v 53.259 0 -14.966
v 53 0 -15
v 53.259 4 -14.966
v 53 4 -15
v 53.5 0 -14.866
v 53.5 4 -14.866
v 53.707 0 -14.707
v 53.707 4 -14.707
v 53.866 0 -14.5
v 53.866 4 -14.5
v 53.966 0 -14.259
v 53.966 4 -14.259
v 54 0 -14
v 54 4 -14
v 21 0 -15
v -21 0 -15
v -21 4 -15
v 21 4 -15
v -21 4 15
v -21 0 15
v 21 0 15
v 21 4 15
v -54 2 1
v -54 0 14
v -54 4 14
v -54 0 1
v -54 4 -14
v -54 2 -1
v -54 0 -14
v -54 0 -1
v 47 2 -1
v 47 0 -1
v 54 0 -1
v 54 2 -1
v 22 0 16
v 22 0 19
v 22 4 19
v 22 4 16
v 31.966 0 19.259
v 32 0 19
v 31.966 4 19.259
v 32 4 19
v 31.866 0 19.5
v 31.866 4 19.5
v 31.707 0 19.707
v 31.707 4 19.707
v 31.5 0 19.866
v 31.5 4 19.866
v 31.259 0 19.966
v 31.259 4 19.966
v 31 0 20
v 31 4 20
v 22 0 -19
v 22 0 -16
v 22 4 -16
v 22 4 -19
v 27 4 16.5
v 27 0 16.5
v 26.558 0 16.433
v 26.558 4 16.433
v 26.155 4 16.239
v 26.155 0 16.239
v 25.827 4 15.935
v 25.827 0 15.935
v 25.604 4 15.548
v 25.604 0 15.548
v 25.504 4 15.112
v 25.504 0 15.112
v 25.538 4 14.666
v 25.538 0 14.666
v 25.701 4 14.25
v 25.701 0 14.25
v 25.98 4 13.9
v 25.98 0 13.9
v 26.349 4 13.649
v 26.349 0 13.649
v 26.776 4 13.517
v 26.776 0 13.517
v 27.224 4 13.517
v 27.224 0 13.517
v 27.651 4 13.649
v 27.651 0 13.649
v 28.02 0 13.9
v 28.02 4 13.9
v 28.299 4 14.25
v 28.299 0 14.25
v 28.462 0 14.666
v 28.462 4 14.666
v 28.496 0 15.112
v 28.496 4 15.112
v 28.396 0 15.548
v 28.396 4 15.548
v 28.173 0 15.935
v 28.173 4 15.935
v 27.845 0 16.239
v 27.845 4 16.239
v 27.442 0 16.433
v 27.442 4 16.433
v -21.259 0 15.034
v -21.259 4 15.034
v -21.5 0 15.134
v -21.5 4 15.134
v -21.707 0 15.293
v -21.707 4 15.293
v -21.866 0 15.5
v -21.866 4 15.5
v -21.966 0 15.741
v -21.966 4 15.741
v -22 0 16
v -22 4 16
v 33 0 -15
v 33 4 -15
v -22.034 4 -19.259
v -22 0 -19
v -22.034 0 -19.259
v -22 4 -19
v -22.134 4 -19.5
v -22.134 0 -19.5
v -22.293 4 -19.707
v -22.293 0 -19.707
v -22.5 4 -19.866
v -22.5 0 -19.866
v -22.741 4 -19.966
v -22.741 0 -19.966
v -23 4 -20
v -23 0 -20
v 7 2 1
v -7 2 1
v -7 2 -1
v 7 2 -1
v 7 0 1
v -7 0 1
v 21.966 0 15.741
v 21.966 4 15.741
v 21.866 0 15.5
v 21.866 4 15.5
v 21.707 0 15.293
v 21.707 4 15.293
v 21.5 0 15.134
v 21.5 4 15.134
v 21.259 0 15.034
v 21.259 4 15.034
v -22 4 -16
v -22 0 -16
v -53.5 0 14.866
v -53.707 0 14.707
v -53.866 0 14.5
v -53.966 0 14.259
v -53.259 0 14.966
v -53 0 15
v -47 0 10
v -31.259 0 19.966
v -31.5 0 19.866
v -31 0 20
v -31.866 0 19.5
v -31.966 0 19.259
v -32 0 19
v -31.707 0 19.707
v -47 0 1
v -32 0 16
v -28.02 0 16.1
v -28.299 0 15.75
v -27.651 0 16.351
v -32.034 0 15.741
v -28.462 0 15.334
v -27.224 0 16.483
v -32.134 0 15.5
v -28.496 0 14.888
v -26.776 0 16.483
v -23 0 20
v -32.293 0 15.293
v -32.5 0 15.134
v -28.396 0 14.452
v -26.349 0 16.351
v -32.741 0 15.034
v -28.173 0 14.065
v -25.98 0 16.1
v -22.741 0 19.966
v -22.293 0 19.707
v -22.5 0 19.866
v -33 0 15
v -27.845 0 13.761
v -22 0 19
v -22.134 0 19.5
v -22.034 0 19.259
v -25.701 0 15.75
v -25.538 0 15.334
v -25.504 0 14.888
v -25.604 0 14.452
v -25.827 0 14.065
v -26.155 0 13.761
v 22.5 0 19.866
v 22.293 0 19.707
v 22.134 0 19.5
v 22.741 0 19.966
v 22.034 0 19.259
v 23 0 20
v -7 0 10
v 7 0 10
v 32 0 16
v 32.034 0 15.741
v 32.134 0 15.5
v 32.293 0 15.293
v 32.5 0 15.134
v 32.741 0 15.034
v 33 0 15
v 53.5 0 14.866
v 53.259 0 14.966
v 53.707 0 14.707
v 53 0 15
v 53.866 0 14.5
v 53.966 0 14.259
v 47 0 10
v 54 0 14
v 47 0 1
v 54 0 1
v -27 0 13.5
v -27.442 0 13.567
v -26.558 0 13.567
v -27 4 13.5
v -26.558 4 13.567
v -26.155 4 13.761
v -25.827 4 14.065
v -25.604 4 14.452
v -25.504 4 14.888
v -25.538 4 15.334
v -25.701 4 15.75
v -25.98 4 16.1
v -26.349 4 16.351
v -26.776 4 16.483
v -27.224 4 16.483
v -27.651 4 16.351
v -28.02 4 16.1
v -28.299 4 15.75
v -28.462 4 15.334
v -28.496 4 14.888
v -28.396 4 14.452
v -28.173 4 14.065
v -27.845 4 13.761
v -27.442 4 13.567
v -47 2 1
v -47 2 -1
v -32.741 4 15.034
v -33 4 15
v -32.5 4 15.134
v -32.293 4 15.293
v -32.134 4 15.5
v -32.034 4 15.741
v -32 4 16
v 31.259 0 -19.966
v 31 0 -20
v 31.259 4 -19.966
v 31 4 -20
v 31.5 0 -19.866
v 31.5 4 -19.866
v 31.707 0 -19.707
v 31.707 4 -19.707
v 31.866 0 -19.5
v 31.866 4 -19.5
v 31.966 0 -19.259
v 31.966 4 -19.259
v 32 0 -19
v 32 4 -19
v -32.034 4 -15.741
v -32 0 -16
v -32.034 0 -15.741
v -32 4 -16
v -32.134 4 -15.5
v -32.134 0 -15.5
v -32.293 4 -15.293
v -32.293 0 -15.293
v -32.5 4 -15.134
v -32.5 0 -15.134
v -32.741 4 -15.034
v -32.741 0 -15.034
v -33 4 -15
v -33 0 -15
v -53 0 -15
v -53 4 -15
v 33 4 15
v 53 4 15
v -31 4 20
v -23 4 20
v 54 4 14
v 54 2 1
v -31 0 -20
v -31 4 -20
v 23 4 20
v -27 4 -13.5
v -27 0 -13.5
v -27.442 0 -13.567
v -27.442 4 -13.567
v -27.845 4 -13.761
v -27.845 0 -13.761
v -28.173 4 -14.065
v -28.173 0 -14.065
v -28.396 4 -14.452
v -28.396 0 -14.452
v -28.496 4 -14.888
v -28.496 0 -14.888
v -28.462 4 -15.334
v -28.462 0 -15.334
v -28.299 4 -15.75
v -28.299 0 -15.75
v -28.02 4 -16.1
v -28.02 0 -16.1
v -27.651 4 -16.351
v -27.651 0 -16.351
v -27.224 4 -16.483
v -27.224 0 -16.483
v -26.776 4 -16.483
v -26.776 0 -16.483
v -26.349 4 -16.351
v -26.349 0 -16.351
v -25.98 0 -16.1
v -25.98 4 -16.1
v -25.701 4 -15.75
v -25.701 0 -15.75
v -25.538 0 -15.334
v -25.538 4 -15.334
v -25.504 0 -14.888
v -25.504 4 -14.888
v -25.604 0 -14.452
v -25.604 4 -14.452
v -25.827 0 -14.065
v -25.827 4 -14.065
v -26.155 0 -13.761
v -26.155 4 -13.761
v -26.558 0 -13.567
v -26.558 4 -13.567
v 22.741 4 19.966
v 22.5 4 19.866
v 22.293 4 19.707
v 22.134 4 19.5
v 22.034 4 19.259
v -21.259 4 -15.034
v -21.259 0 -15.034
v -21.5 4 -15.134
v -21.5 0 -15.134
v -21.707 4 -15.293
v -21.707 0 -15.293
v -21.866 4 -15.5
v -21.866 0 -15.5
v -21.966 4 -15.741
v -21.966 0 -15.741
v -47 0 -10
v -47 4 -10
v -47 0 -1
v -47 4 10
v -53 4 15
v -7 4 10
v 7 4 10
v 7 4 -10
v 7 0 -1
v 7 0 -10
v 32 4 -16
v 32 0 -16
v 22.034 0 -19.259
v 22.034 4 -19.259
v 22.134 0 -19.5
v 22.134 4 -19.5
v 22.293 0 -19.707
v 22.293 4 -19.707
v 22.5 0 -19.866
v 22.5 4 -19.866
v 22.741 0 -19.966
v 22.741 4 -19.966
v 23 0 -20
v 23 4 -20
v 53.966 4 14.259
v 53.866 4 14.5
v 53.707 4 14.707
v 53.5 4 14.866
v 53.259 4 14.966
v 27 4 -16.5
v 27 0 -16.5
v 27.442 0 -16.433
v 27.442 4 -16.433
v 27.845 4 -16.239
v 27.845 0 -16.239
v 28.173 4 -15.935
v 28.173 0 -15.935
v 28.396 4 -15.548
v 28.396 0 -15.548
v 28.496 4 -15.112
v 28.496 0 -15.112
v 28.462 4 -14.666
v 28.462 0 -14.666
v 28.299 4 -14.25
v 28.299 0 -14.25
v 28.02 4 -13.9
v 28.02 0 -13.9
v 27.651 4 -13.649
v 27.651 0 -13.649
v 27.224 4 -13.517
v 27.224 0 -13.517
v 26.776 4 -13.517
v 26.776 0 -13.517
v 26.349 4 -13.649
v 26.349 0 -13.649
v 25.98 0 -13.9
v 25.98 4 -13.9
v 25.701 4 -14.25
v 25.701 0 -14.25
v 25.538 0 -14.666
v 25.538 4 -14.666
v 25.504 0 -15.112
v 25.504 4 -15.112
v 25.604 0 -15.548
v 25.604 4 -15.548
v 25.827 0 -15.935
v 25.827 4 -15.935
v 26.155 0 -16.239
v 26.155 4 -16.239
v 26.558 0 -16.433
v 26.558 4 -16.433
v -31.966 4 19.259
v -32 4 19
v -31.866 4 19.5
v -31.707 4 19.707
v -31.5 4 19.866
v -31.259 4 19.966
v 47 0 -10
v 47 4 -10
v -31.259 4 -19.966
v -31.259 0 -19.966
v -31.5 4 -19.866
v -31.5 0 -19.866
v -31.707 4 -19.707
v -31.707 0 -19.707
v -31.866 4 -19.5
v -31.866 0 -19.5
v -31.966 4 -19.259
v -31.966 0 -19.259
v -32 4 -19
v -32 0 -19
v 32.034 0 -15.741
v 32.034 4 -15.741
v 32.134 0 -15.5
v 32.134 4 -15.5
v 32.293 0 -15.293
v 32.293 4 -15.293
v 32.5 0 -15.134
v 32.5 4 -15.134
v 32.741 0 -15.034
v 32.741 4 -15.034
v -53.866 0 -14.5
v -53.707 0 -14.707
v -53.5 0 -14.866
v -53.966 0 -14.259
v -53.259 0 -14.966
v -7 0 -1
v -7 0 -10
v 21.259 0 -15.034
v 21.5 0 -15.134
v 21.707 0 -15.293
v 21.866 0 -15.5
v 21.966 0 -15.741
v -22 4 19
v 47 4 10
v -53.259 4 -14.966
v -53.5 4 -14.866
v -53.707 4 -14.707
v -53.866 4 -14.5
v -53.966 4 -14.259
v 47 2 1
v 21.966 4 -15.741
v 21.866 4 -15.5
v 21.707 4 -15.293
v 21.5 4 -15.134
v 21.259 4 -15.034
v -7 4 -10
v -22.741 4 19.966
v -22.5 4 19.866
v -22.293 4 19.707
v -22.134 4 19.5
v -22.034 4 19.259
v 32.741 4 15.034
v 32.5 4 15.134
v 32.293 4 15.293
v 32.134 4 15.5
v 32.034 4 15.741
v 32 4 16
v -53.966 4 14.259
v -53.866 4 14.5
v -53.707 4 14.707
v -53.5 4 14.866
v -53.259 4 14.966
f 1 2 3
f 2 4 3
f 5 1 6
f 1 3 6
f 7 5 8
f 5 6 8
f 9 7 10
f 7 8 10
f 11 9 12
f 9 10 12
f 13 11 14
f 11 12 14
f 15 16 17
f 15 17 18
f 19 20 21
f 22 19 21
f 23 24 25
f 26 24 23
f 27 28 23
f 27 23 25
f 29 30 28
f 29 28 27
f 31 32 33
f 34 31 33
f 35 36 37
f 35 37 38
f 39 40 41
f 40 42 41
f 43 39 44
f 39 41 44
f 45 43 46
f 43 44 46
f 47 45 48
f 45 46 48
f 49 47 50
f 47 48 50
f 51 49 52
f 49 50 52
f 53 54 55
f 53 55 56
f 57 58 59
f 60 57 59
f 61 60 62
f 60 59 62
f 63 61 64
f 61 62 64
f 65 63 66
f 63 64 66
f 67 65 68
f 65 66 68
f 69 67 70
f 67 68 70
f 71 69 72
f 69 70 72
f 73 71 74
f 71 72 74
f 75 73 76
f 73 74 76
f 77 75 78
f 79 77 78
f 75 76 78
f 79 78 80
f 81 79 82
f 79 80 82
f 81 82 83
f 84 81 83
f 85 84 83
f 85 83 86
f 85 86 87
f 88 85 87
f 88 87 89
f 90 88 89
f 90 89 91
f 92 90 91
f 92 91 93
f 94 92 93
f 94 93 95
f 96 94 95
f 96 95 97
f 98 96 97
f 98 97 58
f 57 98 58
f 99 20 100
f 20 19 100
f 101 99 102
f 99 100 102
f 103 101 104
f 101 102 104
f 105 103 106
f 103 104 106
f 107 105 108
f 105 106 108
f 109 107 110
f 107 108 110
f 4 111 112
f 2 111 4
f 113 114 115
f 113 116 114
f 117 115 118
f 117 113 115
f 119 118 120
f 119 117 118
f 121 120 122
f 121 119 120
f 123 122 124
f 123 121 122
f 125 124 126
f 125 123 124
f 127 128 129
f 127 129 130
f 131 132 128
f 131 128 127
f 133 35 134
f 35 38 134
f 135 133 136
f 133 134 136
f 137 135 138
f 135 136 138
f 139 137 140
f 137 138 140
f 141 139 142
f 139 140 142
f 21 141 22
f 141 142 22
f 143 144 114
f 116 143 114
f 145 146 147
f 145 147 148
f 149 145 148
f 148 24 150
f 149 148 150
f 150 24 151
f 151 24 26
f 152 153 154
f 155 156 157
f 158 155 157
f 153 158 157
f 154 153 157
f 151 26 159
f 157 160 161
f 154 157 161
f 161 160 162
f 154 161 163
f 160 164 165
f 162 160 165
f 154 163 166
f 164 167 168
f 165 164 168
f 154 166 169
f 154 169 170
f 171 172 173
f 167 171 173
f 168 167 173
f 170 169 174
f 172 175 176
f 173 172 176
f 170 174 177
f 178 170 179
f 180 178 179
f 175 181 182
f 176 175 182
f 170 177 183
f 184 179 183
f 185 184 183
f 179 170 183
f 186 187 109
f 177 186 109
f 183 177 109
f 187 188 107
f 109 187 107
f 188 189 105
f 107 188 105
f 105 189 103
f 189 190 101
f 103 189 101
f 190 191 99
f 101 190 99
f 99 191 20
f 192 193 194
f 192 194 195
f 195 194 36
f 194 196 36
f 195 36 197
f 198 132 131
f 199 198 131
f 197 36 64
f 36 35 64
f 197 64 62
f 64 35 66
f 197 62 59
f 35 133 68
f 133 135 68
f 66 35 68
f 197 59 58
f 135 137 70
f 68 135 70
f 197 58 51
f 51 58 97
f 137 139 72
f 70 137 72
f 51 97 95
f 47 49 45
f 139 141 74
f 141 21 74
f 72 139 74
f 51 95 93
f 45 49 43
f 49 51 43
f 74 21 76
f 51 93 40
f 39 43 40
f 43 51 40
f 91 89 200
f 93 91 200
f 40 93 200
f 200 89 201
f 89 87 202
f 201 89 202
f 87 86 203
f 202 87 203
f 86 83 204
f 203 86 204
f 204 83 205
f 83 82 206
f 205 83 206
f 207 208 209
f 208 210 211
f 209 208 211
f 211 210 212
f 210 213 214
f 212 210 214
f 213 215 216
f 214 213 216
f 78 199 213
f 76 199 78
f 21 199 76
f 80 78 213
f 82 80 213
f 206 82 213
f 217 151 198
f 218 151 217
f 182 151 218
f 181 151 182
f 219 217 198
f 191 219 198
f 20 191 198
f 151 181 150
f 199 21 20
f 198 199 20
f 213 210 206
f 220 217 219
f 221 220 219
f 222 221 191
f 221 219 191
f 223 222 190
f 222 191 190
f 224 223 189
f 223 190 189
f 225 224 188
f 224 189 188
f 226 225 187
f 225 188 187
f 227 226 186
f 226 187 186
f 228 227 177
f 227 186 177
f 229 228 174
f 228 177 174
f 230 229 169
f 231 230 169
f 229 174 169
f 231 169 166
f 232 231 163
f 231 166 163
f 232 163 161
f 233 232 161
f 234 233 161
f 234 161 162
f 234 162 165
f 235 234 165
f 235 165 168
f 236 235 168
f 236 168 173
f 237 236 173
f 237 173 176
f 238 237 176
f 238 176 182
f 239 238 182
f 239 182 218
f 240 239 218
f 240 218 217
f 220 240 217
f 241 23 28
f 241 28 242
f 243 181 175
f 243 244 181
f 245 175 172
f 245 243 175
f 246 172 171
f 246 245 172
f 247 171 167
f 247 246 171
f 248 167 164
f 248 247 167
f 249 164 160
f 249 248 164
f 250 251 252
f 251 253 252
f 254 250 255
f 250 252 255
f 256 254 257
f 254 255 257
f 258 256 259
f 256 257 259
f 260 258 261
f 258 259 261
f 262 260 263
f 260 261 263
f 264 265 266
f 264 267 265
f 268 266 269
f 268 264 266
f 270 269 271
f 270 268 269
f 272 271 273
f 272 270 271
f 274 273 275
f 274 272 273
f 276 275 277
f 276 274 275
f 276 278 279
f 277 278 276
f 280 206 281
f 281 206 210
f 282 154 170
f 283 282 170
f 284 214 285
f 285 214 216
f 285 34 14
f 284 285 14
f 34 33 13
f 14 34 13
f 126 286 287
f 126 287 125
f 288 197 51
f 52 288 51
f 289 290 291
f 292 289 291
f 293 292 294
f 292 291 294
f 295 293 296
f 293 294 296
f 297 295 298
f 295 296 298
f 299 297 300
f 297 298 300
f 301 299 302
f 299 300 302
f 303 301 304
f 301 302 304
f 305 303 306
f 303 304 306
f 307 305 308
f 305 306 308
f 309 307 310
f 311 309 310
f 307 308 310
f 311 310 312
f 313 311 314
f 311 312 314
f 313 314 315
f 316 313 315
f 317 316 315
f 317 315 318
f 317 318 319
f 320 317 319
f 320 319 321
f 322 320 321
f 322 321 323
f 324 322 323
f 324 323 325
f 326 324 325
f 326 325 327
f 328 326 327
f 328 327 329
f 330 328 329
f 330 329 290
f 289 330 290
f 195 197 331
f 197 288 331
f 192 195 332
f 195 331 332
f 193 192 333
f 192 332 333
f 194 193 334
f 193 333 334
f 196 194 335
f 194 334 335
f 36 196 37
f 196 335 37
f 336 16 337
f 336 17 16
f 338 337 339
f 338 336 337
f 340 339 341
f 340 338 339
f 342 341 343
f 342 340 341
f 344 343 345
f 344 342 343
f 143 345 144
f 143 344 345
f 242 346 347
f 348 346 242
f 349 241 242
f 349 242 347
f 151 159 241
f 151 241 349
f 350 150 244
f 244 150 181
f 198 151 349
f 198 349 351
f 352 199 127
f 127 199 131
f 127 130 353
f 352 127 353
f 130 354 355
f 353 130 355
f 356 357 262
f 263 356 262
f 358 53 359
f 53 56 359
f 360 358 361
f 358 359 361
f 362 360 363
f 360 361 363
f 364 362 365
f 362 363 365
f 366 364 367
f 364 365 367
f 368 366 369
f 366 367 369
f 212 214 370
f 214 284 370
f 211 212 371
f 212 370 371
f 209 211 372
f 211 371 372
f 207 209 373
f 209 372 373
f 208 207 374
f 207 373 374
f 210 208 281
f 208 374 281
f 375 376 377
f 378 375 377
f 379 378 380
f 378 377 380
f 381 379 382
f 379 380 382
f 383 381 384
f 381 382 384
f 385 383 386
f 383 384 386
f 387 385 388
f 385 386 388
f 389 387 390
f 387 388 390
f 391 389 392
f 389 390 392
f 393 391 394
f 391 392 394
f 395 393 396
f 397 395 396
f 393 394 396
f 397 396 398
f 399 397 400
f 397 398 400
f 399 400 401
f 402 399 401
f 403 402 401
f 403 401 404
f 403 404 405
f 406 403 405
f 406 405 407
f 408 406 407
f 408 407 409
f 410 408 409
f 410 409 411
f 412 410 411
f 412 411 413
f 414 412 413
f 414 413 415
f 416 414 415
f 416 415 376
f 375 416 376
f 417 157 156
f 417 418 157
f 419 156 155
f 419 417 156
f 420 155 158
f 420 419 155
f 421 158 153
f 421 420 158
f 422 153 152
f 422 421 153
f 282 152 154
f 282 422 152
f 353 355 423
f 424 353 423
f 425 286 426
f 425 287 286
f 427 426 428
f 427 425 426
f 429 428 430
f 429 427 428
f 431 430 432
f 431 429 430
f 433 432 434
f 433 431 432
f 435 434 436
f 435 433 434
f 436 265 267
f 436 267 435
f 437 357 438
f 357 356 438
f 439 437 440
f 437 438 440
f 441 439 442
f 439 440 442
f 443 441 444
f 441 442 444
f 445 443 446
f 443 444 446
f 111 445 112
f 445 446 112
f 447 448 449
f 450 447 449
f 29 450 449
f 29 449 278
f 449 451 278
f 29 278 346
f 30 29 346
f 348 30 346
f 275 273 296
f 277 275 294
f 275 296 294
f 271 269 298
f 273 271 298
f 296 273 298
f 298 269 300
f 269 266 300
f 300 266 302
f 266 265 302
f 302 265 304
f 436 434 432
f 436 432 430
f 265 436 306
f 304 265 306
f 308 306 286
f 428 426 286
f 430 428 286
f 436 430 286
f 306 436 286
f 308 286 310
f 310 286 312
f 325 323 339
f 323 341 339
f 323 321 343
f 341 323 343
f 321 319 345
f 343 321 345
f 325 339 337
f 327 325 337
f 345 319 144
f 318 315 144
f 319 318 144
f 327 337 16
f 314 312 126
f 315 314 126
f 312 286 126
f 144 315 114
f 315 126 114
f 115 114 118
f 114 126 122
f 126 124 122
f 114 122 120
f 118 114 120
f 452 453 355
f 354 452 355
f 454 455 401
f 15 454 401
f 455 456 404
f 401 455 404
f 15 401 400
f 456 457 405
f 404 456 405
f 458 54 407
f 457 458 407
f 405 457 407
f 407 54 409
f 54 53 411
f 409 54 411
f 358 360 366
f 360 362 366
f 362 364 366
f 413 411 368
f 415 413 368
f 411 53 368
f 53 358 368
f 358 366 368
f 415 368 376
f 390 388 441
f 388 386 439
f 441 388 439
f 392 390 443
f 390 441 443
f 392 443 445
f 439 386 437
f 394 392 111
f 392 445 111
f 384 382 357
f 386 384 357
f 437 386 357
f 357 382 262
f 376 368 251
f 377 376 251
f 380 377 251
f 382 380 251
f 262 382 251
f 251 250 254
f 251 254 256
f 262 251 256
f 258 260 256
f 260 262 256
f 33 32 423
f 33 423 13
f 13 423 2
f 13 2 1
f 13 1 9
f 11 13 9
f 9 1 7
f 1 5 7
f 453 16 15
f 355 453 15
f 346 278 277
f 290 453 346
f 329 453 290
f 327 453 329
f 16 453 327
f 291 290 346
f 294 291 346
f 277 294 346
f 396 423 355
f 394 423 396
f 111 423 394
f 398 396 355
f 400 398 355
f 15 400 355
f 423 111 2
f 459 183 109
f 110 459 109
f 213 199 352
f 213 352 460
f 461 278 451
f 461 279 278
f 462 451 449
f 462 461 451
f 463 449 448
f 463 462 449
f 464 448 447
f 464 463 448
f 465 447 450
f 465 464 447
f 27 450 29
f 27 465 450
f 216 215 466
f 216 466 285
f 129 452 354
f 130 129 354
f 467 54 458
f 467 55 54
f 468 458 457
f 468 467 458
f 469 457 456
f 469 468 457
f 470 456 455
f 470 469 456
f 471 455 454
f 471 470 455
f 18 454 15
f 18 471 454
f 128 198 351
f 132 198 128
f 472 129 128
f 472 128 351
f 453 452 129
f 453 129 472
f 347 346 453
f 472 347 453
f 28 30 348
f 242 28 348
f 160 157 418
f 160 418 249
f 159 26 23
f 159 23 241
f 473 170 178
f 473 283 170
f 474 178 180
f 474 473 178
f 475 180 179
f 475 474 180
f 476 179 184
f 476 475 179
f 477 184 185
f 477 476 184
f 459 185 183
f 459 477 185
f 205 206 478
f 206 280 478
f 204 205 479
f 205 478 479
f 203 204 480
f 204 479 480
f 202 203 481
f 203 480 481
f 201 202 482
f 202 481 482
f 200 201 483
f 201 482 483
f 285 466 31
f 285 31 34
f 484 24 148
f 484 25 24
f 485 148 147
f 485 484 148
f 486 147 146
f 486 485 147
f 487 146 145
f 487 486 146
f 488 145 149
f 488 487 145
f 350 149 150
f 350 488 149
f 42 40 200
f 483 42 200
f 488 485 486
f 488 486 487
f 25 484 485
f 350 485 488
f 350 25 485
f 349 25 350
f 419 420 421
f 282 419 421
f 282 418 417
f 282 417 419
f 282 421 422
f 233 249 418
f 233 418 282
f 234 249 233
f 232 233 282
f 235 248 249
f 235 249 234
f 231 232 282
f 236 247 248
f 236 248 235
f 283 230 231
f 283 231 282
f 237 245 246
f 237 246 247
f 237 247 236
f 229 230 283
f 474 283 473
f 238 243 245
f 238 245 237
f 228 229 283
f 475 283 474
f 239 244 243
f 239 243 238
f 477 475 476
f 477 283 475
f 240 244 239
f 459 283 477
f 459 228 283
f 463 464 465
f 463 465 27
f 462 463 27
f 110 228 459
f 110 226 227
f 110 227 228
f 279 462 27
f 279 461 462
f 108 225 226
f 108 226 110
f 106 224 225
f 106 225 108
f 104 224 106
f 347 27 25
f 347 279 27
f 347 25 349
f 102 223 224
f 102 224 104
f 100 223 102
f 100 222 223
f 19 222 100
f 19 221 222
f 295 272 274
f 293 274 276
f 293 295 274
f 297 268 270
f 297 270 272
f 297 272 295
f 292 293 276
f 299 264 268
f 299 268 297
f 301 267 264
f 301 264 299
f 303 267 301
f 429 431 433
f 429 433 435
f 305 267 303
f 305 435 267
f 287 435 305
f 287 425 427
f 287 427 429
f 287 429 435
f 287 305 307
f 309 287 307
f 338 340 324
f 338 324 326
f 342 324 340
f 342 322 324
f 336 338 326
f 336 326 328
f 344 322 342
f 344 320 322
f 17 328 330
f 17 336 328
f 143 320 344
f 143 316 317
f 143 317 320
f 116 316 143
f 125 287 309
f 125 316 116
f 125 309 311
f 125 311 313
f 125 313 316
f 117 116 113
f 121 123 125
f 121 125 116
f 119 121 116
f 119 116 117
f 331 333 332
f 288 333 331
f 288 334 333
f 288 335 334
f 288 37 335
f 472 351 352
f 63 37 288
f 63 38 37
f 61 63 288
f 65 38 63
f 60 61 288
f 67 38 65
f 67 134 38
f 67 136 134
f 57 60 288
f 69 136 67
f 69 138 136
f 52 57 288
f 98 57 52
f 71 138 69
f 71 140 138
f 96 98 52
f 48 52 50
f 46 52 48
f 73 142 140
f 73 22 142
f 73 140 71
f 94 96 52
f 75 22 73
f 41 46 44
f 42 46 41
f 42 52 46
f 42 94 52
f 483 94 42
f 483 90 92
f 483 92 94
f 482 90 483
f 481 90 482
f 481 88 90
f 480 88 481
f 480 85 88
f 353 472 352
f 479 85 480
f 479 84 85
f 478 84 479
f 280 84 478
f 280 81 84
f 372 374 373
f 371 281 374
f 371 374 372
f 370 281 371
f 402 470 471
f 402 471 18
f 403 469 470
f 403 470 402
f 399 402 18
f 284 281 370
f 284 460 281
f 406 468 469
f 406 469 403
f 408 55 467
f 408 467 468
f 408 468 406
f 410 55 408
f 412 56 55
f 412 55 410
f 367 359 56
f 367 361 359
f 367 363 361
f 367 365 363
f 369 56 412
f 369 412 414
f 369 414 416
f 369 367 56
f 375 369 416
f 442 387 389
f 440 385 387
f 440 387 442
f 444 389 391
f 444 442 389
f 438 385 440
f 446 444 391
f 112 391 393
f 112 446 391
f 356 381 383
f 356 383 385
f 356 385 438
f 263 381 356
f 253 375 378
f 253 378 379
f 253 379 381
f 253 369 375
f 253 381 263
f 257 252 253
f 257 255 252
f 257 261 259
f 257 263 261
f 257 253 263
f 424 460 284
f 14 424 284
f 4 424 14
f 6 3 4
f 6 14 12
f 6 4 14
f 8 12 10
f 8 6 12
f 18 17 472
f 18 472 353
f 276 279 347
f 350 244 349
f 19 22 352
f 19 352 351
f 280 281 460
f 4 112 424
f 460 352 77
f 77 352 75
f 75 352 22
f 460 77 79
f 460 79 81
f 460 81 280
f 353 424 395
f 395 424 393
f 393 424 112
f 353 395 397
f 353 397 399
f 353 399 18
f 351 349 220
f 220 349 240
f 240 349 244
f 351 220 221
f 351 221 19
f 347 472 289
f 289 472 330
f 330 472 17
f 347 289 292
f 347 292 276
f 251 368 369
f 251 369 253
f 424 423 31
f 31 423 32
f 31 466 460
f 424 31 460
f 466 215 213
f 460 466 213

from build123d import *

# Parameters (mm, degrees)
SKETCH_2_W          = 10
SKETCH_2_H          = 5
SKETCH_2_W_2        = 108
SKETCH_2_H_2        = 30
EXTRUDE_1_DEPTH     = 4
SKETCH_3_R          = 1.5
SKETCH_3_W          = 94
SKETCH_3_H          = 20
CUT_EXTRUDE_1_DEPTH = 58.723478759
FILLET_1_R          = 1
SKETCH_4_W          = 14
SKETCH_4_H          = 20
EXTRUDE_2_DEPTH     = 4
SKETCH_6_W          = 7
SKETCH_6_H          = 2
SKETCH_6_W_2        = 14
CUT_EXTRUDE_3_DEPTH = 2


with BuildPart() as part:
    # 草图2 → 凸台-拉伸1 (new body)
    with BuildSketch(Plane(origin=(0, 0, 0), x_dir=(1, 0, 0), z_dir=(0, 1, 0))):
        with Locations((27, 17.5)):
            Rectangle(SKETCH_2_W, SKETCH_2_H)
        with Locations((-27, 17.5)):
            Rectangle(SKETCH_2_W, SKETCH_2_H)
        with Locations((-27, -17.5)):
            Rectangle(SKETCH_2_W, SKETCH_2_H)
        with Locations((27, -17.5)):
            Rectangle(SKETCH_2_W, SKETCH_2_H)
        Rectangle(SKETCH_2_W_2, SKETCH_2_H_2)
    extrude(amount=EXTRUDE_1_DEPTH)

    # 草图3 → 切除-拉伸1 (cut, through all)
    with BuildSketch(Plane.XZ):
        with Locations(Location((-27, 15, 0), (0, 0, 270))):
            Circle(SKETCH_3_R)
        with Locations(Location((27, 15, 0), (0, 0, 90))):
            Circle(SKETCH_3_R)
        with Locations(Location((27, -15, 0), (0, 0, 270))):
            Circle(SKETCH_3_R)
        with Locations(Location((-27, -15, 0), (0, 0, 90))):
            Circle(SKETCH_3_R)
        Rectangle(SKETCH_3_W, SKETCH_3_H)
    extrude(amount=-CUT_EXTRUDE_1_DEPTH, mode=Mode.SUBTRACT)

    # 圆角1
    fillet_1_edges = [part.edges().sort_by_distance(p)[0] for p in [
        (32, 2, -15),
        (54, 2, -15),
        (54, 2, 15),
        (32, 2, 15),
        (32, 2, 20),
        (22, 2, 20),
        (22, 2, 15),
        (-22, 2, 15),
        (-22, 2, 20),
        (-32, 2, 20),
        (-32, 2, 15),
        (-54, 2, 15),
        (-54, 2, -15),
        (-32, 2, -15),
        (-32, 2, -20),
        (-22, 2, -20),
        (-22, 2, -15),
        (22, 2, -15),
        (22, 2, -20),
        (32, 2, -20),
    ]]
    fillet(fillet_1_edges, radius=FILLET_1_R)

    # 草图4 → 凸台-拉伸2 (add)
    with BuildSketch(Plane(origin=(0, 0, 0), x_dir=(1, 0, 0), z_dir=(0, 1, 0))):
        Rectangle(SKETCH_4_W, SKETCH_4_H)
    extrude(amount=EXTRUDE_2_DEPTH)

    # 草图6 → 切除-拉伸3 (cut)
    with BuildSketch(Plane.XZ):
        with Locations((-50.5, 0)):
            Rectangle(SKETCH_6_W, SKETCH_6_H)
        Rectangle(SKETCH_6_W_2, SKETCH_6_H)
        with Locations((50.5, 0)):
            Rectangle(SKETCH_6_W, SKETCH_6_H)
    extrude(amount=-CUT_EXTRUDE_3_DEPTH, mode=Mode.SUBTRACT)


solid = part.part
